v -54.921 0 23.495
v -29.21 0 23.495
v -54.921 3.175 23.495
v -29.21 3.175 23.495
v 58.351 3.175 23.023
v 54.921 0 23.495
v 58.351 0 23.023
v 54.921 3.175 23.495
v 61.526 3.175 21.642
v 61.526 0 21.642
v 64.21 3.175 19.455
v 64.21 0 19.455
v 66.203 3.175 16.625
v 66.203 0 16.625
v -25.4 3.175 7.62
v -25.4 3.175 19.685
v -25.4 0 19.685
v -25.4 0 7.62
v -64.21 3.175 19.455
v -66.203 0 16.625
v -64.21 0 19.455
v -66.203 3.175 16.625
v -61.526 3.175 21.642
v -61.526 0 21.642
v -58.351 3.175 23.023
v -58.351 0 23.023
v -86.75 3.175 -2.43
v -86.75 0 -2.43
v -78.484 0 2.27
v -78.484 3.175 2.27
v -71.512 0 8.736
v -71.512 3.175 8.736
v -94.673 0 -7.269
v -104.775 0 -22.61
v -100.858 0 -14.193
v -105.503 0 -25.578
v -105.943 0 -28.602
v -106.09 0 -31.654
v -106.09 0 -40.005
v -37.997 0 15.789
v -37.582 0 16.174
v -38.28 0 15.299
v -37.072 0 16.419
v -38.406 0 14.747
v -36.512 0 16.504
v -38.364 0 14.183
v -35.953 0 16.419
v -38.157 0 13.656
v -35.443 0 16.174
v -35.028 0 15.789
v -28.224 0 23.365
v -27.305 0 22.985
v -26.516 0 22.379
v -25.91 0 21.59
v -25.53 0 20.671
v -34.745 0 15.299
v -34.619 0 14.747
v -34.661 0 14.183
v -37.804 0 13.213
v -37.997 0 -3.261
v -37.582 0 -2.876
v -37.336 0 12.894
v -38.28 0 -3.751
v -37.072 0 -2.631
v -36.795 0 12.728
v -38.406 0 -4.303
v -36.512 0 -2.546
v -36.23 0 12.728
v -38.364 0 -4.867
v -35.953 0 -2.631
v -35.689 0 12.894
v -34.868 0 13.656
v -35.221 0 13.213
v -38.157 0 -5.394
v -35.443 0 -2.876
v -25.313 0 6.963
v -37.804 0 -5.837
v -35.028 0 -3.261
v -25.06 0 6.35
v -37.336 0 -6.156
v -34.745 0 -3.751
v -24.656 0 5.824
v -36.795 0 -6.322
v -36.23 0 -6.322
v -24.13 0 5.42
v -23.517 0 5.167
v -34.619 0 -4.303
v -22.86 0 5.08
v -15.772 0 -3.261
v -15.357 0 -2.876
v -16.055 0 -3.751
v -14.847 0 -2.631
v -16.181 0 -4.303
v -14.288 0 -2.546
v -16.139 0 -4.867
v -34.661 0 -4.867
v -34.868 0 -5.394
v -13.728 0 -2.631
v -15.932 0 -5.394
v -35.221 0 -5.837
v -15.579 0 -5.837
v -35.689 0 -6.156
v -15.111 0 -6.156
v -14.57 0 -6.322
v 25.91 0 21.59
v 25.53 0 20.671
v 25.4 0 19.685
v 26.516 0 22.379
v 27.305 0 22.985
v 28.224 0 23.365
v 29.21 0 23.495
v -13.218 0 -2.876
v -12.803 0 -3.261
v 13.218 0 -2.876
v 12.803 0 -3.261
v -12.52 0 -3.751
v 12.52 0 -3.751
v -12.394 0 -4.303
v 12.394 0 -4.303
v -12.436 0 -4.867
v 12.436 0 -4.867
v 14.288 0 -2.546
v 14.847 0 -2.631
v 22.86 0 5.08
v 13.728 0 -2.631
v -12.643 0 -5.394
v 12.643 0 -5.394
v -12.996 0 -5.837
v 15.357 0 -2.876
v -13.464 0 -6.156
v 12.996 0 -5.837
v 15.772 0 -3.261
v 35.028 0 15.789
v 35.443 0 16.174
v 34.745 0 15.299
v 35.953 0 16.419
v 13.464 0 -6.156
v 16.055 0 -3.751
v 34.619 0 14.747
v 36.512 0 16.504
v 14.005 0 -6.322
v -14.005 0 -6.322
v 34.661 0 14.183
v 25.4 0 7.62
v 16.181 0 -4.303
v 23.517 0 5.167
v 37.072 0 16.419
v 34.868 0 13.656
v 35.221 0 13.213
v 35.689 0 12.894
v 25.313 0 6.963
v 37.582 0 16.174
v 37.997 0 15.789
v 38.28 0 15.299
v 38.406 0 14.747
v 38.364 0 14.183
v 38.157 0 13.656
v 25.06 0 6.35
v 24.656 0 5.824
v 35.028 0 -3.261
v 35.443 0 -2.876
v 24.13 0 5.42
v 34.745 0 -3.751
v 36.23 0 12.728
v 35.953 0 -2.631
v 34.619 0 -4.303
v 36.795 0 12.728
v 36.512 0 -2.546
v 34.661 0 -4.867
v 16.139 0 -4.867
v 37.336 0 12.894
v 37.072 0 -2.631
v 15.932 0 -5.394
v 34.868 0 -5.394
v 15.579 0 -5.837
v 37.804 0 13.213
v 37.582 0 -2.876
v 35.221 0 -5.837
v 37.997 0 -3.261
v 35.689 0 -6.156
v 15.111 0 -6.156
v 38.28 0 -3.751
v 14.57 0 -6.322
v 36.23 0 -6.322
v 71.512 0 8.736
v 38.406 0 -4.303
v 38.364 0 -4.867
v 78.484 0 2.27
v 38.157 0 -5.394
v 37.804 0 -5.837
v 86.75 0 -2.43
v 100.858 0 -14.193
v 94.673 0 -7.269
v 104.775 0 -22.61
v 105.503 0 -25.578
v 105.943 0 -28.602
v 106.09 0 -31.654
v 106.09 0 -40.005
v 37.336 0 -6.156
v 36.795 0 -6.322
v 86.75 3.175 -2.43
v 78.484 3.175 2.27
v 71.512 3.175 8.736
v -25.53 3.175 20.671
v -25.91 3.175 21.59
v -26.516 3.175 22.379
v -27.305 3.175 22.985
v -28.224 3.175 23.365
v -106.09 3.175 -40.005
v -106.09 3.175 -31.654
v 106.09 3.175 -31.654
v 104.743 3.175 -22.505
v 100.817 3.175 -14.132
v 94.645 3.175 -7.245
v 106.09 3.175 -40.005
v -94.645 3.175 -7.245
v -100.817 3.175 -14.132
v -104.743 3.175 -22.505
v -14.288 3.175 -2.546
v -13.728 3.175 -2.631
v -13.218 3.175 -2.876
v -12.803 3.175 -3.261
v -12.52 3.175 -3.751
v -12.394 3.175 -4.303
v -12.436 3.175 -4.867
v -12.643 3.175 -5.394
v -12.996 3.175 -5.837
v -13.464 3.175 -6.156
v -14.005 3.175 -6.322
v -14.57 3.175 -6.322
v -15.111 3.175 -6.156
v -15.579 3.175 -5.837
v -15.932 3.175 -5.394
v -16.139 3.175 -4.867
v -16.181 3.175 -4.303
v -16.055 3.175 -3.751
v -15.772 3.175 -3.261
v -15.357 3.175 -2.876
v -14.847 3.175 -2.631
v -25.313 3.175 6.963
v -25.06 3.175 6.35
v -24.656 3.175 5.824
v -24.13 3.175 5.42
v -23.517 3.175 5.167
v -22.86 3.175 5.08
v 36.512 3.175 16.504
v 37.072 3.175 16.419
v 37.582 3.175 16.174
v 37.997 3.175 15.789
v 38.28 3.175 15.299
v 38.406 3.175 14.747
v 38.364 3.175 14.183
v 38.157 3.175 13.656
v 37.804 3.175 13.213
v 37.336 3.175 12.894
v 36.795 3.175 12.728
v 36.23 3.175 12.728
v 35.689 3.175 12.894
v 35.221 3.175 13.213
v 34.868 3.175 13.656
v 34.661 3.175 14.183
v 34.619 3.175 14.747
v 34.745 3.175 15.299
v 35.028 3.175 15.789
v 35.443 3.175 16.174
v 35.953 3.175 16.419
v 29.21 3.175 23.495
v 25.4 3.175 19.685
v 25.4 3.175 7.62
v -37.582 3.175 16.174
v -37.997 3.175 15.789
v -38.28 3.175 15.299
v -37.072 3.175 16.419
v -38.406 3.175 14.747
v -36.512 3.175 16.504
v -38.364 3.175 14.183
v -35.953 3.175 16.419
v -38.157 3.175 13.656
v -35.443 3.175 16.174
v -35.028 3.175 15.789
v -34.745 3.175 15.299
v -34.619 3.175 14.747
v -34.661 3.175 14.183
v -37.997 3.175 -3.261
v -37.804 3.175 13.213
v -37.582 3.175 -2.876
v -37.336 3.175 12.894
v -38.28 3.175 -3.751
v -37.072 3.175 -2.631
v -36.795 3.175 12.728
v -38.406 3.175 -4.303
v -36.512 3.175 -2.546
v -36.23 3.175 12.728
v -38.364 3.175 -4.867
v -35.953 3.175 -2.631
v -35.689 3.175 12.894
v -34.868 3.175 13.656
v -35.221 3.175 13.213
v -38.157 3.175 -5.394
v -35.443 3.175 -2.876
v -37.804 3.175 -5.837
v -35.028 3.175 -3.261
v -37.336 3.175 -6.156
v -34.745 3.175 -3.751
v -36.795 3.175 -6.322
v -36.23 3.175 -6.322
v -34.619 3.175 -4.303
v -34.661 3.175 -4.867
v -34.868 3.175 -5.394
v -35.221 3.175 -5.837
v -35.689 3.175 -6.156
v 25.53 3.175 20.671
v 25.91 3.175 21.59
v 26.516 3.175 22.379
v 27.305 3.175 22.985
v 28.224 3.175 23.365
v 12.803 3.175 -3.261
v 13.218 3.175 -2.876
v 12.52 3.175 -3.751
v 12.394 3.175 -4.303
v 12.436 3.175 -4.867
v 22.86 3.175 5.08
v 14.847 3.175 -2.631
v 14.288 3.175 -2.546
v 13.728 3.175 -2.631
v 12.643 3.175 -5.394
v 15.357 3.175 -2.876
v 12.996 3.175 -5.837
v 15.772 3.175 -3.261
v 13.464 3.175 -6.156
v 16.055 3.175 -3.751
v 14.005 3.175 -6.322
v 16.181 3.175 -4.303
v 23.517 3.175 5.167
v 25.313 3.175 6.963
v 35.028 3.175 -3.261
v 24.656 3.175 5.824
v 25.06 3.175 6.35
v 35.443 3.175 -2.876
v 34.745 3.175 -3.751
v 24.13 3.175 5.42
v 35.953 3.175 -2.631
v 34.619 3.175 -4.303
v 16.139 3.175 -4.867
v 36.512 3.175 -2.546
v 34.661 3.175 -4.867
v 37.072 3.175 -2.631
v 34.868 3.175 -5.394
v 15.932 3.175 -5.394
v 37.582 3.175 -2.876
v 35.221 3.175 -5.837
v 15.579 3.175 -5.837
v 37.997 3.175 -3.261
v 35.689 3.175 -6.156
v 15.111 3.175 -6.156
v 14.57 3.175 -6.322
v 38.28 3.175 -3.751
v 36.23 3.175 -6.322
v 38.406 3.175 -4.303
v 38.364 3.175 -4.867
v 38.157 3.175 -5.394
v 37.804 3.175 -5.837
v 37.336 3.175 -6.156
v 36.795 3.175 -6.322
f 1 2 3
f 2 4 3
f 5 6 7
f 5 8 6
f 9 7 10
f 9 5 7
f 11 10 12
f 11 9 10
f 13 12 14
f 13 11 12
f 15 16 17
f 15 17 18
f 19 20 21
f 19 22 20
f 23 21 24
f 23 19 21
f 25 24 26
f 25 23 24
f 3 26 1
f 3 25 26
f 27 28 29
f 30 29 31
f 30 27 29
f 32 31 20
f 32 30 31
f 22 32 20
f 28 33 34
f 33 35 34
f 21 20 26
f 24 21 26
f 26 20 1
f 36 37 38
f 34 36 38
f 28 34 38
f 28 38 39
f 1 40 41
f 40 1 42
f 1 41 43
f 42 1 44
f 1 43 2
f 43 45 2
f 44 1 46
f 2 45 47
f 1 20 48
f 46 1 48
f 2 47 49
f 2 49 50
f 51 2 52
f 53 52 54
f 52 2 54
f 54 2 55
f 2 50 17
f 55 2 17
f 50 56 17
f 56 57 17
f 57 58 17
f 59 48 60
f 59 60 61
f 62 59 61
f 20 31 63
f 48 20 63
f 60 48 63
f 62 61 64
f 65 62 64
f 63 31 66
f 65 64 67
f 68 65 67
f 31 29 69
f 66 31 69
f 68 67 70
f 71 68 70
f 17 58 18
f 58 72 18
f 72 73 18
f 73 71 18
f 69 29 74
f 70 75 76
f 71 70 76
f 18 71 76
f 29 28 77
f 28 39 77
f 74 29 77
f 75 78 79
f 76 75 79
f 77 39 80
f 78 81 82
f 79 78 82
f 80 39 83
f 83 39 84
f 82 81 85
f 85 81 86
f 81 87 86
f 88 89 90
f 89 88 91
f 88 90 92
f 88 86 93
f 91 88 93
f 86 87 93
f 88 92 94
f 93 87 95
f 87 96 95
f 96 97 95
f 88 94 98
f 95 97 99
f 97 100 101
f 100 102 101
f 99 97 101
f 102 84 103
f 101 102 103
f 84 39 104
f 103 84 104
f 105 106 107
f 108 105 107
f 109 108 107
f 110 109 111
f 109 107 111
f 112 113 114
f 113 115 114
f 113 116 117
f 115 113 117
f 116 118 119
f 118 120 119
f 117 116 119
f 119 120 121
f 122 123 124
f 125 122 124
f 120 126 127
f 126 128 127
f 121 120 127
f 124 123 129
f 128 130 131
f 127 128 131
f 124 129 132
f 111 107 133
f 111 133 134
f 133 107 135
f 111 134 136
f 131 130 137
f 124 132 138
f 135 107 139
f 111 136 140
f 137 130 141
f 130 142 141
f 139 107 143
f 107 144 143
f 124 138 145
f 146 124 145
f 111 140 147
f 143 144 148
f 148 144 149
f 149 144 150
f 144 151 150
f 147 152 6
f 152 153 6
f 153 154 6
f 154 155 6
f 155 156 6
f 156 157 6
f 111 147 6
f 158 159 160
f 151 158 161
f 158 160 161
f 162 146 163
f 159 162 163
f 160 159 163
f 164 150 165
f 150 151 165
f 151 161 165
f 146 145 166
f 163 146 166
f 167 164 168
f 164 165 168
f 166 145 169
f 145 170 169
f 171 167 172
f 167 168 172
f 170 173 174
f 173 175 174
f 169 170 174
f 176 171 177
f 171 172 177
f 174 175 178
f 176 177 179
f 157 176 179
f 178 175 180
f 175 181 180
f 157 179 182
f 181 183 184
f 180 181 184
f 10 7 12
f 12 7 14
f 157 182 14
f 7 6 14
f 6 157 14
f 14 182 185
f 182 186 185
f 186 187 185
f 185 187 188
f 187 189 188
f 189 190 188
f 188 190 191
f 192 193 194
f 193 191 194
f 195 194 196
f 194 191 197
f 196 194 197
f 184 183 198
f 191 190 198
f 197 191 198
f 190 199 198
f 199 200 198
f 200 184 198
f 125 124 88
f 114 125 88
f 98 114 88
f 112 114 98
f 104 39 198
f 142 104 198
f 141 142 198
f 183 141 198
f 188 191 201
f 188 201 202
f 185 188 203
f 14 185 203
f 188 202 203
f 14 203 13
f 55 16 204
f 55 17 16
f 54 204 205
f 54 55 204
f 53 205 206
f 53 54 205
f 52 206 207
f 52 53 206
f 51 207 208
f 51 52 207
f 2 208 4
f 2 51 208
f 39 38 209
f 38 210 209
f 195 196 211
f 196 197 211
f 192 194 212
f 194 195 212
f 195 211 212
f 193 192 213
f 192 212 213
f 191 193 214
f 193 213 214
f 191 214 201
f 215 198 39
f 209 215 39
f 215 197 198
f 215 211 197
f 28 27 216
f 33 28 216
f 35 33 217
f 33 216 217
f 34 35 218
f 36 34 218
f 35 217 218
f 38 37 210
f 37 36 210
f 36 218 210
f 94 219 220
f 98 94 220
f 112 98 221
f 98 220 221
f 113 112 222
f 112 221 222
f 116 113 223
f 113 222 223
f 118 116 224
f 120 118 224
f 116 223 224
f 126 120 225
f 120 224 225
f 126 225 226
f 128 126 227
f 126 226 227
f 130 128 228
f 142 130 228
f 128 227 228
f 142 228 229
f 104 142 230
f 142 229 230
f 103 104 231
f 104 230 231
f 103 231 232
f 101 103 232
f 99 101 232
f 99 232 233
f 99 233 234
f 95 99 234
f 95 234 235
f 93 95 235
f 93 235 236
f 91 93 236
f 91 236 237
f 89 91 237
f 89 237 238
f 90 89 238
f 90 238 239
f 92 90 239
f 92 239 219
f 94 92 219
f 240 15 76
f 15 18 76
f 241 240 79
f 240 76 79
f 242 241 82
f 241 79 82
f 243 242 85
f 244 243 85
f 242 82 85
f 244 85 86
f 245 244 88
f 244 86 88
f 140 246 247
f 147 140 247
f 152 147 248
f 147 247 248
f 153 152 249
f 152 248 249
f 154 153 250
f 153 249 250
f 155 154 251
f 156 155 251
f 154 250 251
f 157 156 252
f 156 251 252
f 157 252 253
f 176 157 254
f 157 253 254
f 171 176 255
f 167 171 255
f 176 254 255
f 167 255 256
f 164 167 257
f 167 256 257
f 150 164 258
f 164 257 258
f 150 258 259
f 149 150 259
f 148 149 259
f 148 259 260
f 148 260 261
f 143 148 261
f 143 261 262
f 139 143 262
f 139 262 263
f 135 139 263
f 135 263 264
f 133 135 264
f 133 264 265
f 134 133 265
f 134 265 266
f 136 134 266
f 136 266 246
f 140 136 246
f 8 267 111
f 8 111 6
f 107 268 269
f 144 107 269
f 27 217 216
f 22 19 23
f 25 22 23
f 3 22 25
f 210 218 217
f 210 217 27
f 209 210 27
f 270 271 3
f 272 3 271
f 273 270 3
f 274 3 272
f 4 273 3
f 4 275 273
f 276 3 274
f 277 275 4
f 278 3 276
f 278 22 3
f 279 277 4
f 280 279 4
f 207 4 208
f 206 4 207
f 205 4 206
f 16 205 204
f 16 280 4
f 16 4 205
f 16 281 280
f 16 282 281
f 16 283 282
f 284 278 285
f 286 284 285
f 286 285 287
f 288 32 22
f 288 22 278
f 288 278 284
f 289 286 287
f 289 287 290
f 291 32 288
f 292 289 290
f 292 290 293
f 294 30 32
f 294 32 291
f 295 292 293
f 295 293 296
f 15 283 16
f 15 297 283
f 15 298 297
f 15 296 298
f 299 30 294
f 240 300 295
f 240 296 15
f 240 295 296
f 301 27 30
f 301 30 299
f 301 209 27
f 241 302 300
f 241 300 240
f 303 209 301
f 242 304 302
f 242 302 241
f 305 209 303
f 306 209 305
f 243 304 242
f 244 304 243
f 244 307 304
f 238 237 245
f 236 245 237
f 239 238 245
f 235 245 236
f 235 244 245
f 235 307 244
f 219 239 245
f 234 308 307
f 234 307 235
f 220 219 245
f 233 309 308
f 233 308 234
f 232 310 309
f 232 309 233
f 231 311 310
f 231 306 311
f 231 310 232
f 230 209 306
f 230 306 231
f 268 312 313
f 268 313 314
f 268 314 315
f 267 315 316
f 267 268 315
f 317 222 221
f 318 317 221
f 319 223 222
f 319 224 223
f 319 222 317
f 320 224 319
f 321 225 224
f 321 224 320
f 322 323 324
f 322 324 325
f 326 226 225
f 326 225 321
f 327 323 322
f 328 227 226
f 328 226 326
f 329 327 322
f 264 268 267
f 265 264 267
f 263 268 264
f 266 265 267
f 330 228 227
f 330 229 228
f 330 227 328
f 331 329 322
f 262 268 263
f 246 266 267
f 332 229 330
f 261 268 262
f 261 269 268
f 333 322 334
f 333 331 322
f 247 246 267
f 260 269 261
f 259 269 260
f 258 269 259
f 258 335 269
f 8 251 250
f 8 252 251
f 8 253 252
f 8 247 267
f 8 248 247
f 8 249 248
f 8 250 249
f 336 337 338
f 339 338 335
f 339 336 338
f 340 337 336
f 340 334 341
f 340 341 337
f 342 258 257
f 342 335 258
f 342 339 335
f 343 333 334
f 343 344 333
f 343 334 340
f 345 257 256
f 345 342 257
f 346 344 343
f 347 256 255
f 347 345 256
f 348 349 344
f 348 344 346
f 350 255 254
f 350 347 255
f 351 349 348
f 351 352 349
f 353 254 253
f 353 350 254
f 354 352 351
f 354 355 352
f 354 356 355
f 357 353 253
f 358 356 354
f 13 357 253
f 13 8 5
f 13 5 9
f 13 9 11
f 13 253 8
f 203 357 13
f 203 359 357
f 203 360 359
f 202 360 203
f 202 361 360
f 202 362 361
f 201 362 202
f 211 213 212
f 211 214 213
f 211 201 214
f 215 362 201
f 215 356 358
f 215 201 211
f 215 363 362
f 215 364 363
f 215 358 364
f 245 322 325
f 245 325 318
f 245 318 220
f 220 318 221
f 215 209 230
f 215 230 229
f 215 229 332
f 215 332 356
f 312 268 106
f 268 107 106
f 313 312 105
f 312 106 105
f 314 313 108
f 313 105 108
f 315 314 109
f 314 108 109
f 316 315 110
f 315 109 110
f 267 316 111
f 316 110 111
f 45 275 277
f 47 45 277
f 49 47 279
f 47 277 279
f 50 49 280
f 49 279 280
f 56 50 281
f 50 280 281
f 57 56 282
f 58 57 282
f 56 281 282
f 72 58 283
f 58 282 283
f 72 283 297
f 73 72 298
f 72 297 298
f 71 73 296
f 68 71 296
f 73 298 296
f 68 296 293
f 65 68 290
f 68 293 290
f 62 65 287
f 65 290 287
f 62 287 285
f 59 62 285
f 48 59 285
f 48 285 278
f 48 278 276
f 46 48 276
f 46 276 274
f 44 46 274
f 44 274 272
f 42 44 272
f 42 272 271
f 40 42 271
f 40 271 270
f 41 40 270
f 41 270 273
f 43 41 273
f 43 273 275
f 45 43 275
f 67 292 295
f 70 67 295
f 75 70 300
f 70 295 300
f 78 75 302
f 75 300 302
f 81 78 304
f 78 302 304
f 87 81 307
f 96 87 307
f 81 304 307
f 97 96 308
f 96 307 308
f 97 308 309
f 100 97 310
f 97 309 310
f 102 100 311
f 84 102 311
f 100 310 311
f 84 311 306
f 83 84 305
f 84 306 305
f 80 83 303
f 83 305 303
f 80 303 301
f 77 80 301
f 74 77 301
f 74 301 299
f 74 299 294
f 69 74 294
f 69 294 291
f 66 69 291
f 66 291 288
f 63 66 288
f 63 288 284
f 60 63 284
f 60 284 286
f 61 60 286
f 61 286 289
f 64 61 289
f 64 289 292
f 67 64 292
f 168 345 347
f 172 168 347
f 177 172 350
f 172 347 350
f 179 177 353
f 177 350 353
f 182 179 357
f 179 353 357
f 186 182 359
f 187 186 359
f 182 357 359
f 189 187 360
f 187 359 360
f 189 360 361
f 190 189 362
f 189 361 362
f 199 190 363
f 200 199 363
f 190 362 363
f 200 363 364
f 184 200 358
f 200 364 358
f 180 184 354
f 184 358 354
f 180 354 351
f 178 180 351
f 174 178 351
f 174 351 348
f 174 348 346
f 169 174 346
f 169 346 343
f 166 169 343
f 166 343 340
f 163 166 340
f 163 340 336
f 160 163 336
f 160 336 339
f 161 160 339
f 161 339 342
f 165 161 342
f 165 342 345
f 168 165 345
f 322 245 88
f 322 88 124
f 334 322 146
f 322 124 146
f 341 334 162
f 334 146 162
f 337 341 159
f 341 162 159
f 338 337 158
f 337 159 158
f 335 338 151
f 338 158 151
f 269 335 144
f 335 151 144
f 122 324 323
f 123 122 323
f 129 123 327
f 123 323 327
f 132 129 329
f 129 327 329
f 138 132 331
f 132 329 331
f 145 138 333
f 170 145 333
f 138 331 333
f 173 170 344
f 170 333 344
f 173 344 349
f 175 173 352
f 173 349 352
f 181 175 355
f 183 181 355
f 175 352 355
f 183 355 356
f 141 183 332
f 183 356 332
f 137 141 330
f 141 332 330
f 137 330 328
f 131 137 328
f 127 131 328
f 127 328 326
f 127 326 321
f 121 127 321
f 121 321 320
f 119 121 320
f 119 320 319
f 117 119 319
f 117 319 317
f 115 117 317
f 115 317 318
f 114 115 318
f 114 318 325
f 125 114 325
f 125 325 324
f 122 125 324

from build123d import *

# Parameters (mm, degrees)
SKETCH1_W              = 209.55
SKETCH1_H              = 80.01
BOSS_EXTRUDE1_DEPTH    = 3.175
SKETCH3_R              = 1.89865
CUT_EXTRUDE1_DEPTH     = 113.197510111
SKETCH29_W             = 209.55
SKETCH29_H             = 16.51
CUT_EXTRUDE6_DEPTH     = 113.197510111
BOSS_EXTRUDE6_DEPTH    = 63.5
CUT_EXTRUDE3_DEPTH     = 138.912061642
CUT_EXTRUDE4_DEPTH     = 138.357542769
CUT_EXTRUDE7_REACH     = 139.912
SKETCH30_W             = 50.8
SKETCH30_H             = 18.415
CUT_EXTRUDE9_DEPTH     = 138.912061642
FILLET6_R              = 12.7
FILLET8_R              = 2.54
FILLET9_R              = 3.81
FILLET11_R             = 31.75
CONVERT_SOLID4_START   = -2
CONVERT_SOLID4_DEPTH   = 2
CONVERT_SOLID4_2_DEPTH = 3.175


with BuildPart() as part:
    # Sketch1 → Boss-Extrude1 (new body)
    with BuildSketch(Plane(origin=(0, 0, 0), x_dir=(1, 0, 0), z_dir=(0, 1, 0))):
        Rectangle(SKETCH1_W, SKETCH1_H)
    extrude(amount=BOSS_EXTRUDE1_DEPTH)

    # Sketch3 → Cut-Extrude1 (cut, through all)
    with BuildSketch(Plane(origin=(0, 3.175, 0), x_dir=(1, 0, 0), z_dir=(0, 1, 0))):
        with Locations(Location((36.5125, -14.605, 0), (0, 0, 270))):
            Circle(SKETCH3_R)
        with Locations(Location((14.2875, -14.605, 0), (0, 0, 270))):
            Circle(SKETCH3_R)
        with Locations(Location((-14.2875, -14.605, 0), (0, 0, 270))):
            Circle(SKETCH3_R)
        with Locations(Location((-36.5125, -14.605, 0), (0, 0, 270))):
            Circle(SKETCH3_R)
        with Locations(Location((36.5125, 4.445, 0), (0, 0, 270))):
            Circle(SKETCH3_R)
        with Locations(Location((14.2875, 4.445, 0), (0, 0, 270))):
            Circle(SKETCH3_R)
        with Locations(Location((-14.2875, 4.445, 0), (0, 0, 270))):
            Circle(SKETCH3_R)
        with Locations(Location((-36.5125, 4.445, 0), (0, 0, 270))):
            Circle(SKETCH3_R)
    extrude(amount=-CUT_EXTRUDE1_DEPTH, mode=Mode.SUBTRACT)

    # Sketch29 → Cut-Extrude6 (cut, through all)
    with BuildSketch(Plane(origin=(0, 3.175, 0), x_dir=(1, 0, 0), z_dir=(0, 1, 0))):
        with Locations((0, -31.75)):
            Rectangle(SKETCH29_W, SKETCH29_H)
    extrude(amount=-CUT_EXTRUDE6_DEPTH, mode=Mode.SUBTRACT)

    # Sketch19 → Boss-Extrude6 (add, through all)
    with BuildSketch(Plane(origin=(0, 0, -40.005), x_dir=(-1, 0, 0), z_dir=(0, 0, -1))):
        Polygon((-104.775, 0), (-127.225640303, -22.450640303), (-129.470704333, -20.205576272), (-106.090128061, 3.175), (-104.775, 3.175), align=None)
    boss_extrude6 = extrude(amount=-BOSS_EXTRUDE6_DEPTH)

    # Sketch25 → Cut-Extrude3 (cut, through all)
    with BuildSketch(Plane(origin=(0, 3.175, 0), x_dir=(1, 0, 0), z_dir=(0, 1, 0))):
        with BuildLine():
            Line((144.190128061, 11.508273959), (97.502219088, 5.361694136))
            ThreePointArc((97.502219088, 5.361694136), (75.663289052, -66.631609949), (144.190128061, -35.58250314))
            Line((144.190128061, -35.58250314), (144.190128061, 11.508273959))
        make_face()
    cut_extrude3 = extrude(amount=-CUT_EXTRUDE3_DEPTH, mode=Mode.SUBTRACT)

    # Sketch26 → Cut-Extrude4 (cut, through all)
    with BuildSketch(Plane(origin=(0, 0, 0), x_dir=(0, 0, -1), z_dir=(1, 0, 0))):
        Polygon((40.005, 3.175), (14.379359697, -22.450640303), (40.005, -22.450640303), align=None)
    cut_extrude4 = extrude(amount=CUT_EXTRUDE4_DEPTH, mode=Mode.SUBTRACT)

    # Sketch30 → Cut-Extrude7 (cut, up to next)
    with BuildSketch(Plane(origin=(0, 3.175, 0), x_dir=(1, 0, 0), z_dir=(0, 1, 0)), mode=Mode.PRIVATE) as cut_extrude7_sk1:
        with Locations((0, -14.2875)):
            Rectangle(SKETCH30_W, SKETCH30_H)
    cut_extrude7_tool1 = extrude(cut_extrude7_sk1.sketch, amount=-CUT_EXTRUDE7_REACH, mode=Mode.PRIVATE) & part.part
    add(cut_extrude7_tool1.solids().sort_by_distance((0, 3.175, 14.2875))[0], mode=Mode.SUBTRACT)

    # Mirror9: Boss-Extrude6, Cut-Extrude3, Cut-Extrude4 across plane
    add(boss_extrude6.mirror(Plane(origin=(0, 0, 0), x_dir=(0, 0, 1), z_dir=(1, 0, 0))))
    add(cut_extrude3.mirror(Plane(origin=(0, 0, 0), x_dir=(0, 0, 1), z_dir=(1, 0, 0))), mode=Mode.SUBTRACT)
    add(cut_extrude4.mirror(Plane(origin=(0, 0, 0), x_dir=(0, 0, 1), z_dir=(1, 0, 0))), mode=Mode.SUBTRACT)

    # Sketch32 → Cut-Extrude9 (cut, through all)
    with BuildSketch(Plane(origin=(0, 3.175, 0), x_dir=(1, 0, 0), z_dir=(0, 1, 0))):
        Polygon((-106.090128061, 6.492313801), (-106.090128061, 40.005), (-129.470704333, 16.624423728), (-129.470704333, 9.570425062), align=None)
        Polygon((106.090128061, 6.492313801), (106.090128061, 40.005), (129.470704333, 16.624423728), (129.470704333, 9.570425062), align=None)
    extrude(amount=-CUT_EXTRUDE9_DEPTH, mode=Mode.SUBTRACT)

    # Fillet6
    fillet6_edges = [part.edges().sort_by_distance(p)[0] for p in [
        (-63.403689339, 1.5875, 23.495),
        (63.403689339, 1.5875, 23.495),
    ]]
    fillet(fillet6_edges, radius=FILLET6_R)

    # Fillet8
    fillet8_edges = [part.edges().sort_by_distance(p)[0] for p in [
        (25.4, 1.5875, 5.08),
        (-25.4, 1.5875, 5.08),
    ]]
    fillet(fillet8_edges, radius=FILLET8_R)

    # Fillet9
    fillet9_edges = [part.edges().sort_by_distance(p)[0] for p in [
        (25.4, 1.5875, 23.495),
        (-25.4, 1.5875, 23.495),
    ]]
    fillet(fillet9_edges, radius=FILLET9_R)

    # Fillet11
    # the kernel refuses this fillet: 31.75 mm, written as the material it takes off along each edge
    with BuildSketch(Plane(origin=(-106.090128061, 66.078198255, -6.492313801), x_dir=(0.9786385895506081, 0, 0.20558820744973783), z_dir=(0, -1, 0))) as fillet11_piece_1:
        with BuildLine():
            CenterArc((25.898912909, -31.151224474), FILLET11_R, 101.145067179, 66.990998507)
            Line((-5.172862309, -24.623798888), (-8.280039831, -23.971056329))
            Line((-8.280039831, -23.971056329), (-3.107177522, 0.652742559))
            Line((-3.107177522, 0.652742559), (0.241590205, 3.165795188))
            ThreePointArc((0.241590205, 3.165795188), (8.8784914, 2.506690411), (19.14812824, 3.115122447))
            Line((19.14812824, 3.115122447), (19.761835937, 0))
        make_face()
    extrude(amount=130.296524571, mode=Mode.SUBTRACT)
    with BuildSketch(Plane(origin=(106.090128061, 66.078198255, -6.492313801), x_dir=(-0.9786385895506081, 0, 0.20558820744973783), z_dir=(0, -1, 0))) as fillet11_piece_2:
        with BuildLine():
            CenterArc((25.898912909, 31.151224474), FILLET11_R, 191.863934313, 66.990998507)
            Line((-5.172862309, 24.623798888), (-8.280039831, 23.971056329))
            Line((-8.280039831, 23.971056329), (-3.107177522, -0.652742559))
            Line((-3.107177522, -0.652742559), (0.241590205, -3.165795188))
            ThreePointArc((0.241590205, -3.165795188), (8.8784914, -2.506690411), (19.14812824, -3.115122447))
            Line((19.14812824, -3.115122447), (19.761835937, 0))
        make_face()
    extrude(amount=130.296524571, mode=Mode.SUBTRACT)

    # Convert-Solid4: read off the stored shape, not the designer's step
    # Convert-Solid4 outline → Convert-Solid4 (cut)
    with BuildSketch(Plane(origin=(0, 0, 0), x_dir=(1, 0, 0), z_dir=(0, 1, 0)).offset(CONVERT_SOLID4_START)):
        with BuildLine():
            Line((106.090128061, 31.653593103), (106.090128061, 40.005))
            Line((106.090128061, 40.005), (-106.090128061, 40.005))
            Line((-106.090128061, 40.005), (-106.090128061, 31.653593103))
            ThreePointArc((-106.090128061, 31.653593103), (-105.626557255, 26.247869444), (-104.249381712, 21))
            Line((-104.249381712, 21), (104.249381712, 21))
            ThreePointArc((104.249381712, 21), (105.626557255, 26.247869444), (106.090128061, 31.653593103))
        make_face()
    extrude(amount=CONVERT_SOLID4_DEPTH, mode=Mode.SUBTRACT)

    # Convert-Solid4 2 outline → Convert-Solid4 2 (add)
    with BuildSketch(Plane(origin=(0, 0, 0), x_dir=(1, 0, 0), z_dir=(0, 1, 0))):
        with BuildLine():
            Line((106.090128061, 31.653593103), (106.090128061, 40.005))
            Line((106.090128061, 40.005), (-106.090128061, 40.005))
            Line((-106.090128061, 40.005), (-106.090128061, 31.653593103))
            ThreePointArc((-106.090128061, 31.653593103), (-105.626557255, 26.247869444), (-104.249381712, 21))
            Line((-104.249381712, 21), (104.249381712, 21))
            ThreePointArc((104.249381712, 21), (105.626557255, 26.247869444), (106.090128061, 31.653593103))
        make_face()
    extrude(amount=CONVERT_SOLID4_2_DEPTH)


solid = part.part
